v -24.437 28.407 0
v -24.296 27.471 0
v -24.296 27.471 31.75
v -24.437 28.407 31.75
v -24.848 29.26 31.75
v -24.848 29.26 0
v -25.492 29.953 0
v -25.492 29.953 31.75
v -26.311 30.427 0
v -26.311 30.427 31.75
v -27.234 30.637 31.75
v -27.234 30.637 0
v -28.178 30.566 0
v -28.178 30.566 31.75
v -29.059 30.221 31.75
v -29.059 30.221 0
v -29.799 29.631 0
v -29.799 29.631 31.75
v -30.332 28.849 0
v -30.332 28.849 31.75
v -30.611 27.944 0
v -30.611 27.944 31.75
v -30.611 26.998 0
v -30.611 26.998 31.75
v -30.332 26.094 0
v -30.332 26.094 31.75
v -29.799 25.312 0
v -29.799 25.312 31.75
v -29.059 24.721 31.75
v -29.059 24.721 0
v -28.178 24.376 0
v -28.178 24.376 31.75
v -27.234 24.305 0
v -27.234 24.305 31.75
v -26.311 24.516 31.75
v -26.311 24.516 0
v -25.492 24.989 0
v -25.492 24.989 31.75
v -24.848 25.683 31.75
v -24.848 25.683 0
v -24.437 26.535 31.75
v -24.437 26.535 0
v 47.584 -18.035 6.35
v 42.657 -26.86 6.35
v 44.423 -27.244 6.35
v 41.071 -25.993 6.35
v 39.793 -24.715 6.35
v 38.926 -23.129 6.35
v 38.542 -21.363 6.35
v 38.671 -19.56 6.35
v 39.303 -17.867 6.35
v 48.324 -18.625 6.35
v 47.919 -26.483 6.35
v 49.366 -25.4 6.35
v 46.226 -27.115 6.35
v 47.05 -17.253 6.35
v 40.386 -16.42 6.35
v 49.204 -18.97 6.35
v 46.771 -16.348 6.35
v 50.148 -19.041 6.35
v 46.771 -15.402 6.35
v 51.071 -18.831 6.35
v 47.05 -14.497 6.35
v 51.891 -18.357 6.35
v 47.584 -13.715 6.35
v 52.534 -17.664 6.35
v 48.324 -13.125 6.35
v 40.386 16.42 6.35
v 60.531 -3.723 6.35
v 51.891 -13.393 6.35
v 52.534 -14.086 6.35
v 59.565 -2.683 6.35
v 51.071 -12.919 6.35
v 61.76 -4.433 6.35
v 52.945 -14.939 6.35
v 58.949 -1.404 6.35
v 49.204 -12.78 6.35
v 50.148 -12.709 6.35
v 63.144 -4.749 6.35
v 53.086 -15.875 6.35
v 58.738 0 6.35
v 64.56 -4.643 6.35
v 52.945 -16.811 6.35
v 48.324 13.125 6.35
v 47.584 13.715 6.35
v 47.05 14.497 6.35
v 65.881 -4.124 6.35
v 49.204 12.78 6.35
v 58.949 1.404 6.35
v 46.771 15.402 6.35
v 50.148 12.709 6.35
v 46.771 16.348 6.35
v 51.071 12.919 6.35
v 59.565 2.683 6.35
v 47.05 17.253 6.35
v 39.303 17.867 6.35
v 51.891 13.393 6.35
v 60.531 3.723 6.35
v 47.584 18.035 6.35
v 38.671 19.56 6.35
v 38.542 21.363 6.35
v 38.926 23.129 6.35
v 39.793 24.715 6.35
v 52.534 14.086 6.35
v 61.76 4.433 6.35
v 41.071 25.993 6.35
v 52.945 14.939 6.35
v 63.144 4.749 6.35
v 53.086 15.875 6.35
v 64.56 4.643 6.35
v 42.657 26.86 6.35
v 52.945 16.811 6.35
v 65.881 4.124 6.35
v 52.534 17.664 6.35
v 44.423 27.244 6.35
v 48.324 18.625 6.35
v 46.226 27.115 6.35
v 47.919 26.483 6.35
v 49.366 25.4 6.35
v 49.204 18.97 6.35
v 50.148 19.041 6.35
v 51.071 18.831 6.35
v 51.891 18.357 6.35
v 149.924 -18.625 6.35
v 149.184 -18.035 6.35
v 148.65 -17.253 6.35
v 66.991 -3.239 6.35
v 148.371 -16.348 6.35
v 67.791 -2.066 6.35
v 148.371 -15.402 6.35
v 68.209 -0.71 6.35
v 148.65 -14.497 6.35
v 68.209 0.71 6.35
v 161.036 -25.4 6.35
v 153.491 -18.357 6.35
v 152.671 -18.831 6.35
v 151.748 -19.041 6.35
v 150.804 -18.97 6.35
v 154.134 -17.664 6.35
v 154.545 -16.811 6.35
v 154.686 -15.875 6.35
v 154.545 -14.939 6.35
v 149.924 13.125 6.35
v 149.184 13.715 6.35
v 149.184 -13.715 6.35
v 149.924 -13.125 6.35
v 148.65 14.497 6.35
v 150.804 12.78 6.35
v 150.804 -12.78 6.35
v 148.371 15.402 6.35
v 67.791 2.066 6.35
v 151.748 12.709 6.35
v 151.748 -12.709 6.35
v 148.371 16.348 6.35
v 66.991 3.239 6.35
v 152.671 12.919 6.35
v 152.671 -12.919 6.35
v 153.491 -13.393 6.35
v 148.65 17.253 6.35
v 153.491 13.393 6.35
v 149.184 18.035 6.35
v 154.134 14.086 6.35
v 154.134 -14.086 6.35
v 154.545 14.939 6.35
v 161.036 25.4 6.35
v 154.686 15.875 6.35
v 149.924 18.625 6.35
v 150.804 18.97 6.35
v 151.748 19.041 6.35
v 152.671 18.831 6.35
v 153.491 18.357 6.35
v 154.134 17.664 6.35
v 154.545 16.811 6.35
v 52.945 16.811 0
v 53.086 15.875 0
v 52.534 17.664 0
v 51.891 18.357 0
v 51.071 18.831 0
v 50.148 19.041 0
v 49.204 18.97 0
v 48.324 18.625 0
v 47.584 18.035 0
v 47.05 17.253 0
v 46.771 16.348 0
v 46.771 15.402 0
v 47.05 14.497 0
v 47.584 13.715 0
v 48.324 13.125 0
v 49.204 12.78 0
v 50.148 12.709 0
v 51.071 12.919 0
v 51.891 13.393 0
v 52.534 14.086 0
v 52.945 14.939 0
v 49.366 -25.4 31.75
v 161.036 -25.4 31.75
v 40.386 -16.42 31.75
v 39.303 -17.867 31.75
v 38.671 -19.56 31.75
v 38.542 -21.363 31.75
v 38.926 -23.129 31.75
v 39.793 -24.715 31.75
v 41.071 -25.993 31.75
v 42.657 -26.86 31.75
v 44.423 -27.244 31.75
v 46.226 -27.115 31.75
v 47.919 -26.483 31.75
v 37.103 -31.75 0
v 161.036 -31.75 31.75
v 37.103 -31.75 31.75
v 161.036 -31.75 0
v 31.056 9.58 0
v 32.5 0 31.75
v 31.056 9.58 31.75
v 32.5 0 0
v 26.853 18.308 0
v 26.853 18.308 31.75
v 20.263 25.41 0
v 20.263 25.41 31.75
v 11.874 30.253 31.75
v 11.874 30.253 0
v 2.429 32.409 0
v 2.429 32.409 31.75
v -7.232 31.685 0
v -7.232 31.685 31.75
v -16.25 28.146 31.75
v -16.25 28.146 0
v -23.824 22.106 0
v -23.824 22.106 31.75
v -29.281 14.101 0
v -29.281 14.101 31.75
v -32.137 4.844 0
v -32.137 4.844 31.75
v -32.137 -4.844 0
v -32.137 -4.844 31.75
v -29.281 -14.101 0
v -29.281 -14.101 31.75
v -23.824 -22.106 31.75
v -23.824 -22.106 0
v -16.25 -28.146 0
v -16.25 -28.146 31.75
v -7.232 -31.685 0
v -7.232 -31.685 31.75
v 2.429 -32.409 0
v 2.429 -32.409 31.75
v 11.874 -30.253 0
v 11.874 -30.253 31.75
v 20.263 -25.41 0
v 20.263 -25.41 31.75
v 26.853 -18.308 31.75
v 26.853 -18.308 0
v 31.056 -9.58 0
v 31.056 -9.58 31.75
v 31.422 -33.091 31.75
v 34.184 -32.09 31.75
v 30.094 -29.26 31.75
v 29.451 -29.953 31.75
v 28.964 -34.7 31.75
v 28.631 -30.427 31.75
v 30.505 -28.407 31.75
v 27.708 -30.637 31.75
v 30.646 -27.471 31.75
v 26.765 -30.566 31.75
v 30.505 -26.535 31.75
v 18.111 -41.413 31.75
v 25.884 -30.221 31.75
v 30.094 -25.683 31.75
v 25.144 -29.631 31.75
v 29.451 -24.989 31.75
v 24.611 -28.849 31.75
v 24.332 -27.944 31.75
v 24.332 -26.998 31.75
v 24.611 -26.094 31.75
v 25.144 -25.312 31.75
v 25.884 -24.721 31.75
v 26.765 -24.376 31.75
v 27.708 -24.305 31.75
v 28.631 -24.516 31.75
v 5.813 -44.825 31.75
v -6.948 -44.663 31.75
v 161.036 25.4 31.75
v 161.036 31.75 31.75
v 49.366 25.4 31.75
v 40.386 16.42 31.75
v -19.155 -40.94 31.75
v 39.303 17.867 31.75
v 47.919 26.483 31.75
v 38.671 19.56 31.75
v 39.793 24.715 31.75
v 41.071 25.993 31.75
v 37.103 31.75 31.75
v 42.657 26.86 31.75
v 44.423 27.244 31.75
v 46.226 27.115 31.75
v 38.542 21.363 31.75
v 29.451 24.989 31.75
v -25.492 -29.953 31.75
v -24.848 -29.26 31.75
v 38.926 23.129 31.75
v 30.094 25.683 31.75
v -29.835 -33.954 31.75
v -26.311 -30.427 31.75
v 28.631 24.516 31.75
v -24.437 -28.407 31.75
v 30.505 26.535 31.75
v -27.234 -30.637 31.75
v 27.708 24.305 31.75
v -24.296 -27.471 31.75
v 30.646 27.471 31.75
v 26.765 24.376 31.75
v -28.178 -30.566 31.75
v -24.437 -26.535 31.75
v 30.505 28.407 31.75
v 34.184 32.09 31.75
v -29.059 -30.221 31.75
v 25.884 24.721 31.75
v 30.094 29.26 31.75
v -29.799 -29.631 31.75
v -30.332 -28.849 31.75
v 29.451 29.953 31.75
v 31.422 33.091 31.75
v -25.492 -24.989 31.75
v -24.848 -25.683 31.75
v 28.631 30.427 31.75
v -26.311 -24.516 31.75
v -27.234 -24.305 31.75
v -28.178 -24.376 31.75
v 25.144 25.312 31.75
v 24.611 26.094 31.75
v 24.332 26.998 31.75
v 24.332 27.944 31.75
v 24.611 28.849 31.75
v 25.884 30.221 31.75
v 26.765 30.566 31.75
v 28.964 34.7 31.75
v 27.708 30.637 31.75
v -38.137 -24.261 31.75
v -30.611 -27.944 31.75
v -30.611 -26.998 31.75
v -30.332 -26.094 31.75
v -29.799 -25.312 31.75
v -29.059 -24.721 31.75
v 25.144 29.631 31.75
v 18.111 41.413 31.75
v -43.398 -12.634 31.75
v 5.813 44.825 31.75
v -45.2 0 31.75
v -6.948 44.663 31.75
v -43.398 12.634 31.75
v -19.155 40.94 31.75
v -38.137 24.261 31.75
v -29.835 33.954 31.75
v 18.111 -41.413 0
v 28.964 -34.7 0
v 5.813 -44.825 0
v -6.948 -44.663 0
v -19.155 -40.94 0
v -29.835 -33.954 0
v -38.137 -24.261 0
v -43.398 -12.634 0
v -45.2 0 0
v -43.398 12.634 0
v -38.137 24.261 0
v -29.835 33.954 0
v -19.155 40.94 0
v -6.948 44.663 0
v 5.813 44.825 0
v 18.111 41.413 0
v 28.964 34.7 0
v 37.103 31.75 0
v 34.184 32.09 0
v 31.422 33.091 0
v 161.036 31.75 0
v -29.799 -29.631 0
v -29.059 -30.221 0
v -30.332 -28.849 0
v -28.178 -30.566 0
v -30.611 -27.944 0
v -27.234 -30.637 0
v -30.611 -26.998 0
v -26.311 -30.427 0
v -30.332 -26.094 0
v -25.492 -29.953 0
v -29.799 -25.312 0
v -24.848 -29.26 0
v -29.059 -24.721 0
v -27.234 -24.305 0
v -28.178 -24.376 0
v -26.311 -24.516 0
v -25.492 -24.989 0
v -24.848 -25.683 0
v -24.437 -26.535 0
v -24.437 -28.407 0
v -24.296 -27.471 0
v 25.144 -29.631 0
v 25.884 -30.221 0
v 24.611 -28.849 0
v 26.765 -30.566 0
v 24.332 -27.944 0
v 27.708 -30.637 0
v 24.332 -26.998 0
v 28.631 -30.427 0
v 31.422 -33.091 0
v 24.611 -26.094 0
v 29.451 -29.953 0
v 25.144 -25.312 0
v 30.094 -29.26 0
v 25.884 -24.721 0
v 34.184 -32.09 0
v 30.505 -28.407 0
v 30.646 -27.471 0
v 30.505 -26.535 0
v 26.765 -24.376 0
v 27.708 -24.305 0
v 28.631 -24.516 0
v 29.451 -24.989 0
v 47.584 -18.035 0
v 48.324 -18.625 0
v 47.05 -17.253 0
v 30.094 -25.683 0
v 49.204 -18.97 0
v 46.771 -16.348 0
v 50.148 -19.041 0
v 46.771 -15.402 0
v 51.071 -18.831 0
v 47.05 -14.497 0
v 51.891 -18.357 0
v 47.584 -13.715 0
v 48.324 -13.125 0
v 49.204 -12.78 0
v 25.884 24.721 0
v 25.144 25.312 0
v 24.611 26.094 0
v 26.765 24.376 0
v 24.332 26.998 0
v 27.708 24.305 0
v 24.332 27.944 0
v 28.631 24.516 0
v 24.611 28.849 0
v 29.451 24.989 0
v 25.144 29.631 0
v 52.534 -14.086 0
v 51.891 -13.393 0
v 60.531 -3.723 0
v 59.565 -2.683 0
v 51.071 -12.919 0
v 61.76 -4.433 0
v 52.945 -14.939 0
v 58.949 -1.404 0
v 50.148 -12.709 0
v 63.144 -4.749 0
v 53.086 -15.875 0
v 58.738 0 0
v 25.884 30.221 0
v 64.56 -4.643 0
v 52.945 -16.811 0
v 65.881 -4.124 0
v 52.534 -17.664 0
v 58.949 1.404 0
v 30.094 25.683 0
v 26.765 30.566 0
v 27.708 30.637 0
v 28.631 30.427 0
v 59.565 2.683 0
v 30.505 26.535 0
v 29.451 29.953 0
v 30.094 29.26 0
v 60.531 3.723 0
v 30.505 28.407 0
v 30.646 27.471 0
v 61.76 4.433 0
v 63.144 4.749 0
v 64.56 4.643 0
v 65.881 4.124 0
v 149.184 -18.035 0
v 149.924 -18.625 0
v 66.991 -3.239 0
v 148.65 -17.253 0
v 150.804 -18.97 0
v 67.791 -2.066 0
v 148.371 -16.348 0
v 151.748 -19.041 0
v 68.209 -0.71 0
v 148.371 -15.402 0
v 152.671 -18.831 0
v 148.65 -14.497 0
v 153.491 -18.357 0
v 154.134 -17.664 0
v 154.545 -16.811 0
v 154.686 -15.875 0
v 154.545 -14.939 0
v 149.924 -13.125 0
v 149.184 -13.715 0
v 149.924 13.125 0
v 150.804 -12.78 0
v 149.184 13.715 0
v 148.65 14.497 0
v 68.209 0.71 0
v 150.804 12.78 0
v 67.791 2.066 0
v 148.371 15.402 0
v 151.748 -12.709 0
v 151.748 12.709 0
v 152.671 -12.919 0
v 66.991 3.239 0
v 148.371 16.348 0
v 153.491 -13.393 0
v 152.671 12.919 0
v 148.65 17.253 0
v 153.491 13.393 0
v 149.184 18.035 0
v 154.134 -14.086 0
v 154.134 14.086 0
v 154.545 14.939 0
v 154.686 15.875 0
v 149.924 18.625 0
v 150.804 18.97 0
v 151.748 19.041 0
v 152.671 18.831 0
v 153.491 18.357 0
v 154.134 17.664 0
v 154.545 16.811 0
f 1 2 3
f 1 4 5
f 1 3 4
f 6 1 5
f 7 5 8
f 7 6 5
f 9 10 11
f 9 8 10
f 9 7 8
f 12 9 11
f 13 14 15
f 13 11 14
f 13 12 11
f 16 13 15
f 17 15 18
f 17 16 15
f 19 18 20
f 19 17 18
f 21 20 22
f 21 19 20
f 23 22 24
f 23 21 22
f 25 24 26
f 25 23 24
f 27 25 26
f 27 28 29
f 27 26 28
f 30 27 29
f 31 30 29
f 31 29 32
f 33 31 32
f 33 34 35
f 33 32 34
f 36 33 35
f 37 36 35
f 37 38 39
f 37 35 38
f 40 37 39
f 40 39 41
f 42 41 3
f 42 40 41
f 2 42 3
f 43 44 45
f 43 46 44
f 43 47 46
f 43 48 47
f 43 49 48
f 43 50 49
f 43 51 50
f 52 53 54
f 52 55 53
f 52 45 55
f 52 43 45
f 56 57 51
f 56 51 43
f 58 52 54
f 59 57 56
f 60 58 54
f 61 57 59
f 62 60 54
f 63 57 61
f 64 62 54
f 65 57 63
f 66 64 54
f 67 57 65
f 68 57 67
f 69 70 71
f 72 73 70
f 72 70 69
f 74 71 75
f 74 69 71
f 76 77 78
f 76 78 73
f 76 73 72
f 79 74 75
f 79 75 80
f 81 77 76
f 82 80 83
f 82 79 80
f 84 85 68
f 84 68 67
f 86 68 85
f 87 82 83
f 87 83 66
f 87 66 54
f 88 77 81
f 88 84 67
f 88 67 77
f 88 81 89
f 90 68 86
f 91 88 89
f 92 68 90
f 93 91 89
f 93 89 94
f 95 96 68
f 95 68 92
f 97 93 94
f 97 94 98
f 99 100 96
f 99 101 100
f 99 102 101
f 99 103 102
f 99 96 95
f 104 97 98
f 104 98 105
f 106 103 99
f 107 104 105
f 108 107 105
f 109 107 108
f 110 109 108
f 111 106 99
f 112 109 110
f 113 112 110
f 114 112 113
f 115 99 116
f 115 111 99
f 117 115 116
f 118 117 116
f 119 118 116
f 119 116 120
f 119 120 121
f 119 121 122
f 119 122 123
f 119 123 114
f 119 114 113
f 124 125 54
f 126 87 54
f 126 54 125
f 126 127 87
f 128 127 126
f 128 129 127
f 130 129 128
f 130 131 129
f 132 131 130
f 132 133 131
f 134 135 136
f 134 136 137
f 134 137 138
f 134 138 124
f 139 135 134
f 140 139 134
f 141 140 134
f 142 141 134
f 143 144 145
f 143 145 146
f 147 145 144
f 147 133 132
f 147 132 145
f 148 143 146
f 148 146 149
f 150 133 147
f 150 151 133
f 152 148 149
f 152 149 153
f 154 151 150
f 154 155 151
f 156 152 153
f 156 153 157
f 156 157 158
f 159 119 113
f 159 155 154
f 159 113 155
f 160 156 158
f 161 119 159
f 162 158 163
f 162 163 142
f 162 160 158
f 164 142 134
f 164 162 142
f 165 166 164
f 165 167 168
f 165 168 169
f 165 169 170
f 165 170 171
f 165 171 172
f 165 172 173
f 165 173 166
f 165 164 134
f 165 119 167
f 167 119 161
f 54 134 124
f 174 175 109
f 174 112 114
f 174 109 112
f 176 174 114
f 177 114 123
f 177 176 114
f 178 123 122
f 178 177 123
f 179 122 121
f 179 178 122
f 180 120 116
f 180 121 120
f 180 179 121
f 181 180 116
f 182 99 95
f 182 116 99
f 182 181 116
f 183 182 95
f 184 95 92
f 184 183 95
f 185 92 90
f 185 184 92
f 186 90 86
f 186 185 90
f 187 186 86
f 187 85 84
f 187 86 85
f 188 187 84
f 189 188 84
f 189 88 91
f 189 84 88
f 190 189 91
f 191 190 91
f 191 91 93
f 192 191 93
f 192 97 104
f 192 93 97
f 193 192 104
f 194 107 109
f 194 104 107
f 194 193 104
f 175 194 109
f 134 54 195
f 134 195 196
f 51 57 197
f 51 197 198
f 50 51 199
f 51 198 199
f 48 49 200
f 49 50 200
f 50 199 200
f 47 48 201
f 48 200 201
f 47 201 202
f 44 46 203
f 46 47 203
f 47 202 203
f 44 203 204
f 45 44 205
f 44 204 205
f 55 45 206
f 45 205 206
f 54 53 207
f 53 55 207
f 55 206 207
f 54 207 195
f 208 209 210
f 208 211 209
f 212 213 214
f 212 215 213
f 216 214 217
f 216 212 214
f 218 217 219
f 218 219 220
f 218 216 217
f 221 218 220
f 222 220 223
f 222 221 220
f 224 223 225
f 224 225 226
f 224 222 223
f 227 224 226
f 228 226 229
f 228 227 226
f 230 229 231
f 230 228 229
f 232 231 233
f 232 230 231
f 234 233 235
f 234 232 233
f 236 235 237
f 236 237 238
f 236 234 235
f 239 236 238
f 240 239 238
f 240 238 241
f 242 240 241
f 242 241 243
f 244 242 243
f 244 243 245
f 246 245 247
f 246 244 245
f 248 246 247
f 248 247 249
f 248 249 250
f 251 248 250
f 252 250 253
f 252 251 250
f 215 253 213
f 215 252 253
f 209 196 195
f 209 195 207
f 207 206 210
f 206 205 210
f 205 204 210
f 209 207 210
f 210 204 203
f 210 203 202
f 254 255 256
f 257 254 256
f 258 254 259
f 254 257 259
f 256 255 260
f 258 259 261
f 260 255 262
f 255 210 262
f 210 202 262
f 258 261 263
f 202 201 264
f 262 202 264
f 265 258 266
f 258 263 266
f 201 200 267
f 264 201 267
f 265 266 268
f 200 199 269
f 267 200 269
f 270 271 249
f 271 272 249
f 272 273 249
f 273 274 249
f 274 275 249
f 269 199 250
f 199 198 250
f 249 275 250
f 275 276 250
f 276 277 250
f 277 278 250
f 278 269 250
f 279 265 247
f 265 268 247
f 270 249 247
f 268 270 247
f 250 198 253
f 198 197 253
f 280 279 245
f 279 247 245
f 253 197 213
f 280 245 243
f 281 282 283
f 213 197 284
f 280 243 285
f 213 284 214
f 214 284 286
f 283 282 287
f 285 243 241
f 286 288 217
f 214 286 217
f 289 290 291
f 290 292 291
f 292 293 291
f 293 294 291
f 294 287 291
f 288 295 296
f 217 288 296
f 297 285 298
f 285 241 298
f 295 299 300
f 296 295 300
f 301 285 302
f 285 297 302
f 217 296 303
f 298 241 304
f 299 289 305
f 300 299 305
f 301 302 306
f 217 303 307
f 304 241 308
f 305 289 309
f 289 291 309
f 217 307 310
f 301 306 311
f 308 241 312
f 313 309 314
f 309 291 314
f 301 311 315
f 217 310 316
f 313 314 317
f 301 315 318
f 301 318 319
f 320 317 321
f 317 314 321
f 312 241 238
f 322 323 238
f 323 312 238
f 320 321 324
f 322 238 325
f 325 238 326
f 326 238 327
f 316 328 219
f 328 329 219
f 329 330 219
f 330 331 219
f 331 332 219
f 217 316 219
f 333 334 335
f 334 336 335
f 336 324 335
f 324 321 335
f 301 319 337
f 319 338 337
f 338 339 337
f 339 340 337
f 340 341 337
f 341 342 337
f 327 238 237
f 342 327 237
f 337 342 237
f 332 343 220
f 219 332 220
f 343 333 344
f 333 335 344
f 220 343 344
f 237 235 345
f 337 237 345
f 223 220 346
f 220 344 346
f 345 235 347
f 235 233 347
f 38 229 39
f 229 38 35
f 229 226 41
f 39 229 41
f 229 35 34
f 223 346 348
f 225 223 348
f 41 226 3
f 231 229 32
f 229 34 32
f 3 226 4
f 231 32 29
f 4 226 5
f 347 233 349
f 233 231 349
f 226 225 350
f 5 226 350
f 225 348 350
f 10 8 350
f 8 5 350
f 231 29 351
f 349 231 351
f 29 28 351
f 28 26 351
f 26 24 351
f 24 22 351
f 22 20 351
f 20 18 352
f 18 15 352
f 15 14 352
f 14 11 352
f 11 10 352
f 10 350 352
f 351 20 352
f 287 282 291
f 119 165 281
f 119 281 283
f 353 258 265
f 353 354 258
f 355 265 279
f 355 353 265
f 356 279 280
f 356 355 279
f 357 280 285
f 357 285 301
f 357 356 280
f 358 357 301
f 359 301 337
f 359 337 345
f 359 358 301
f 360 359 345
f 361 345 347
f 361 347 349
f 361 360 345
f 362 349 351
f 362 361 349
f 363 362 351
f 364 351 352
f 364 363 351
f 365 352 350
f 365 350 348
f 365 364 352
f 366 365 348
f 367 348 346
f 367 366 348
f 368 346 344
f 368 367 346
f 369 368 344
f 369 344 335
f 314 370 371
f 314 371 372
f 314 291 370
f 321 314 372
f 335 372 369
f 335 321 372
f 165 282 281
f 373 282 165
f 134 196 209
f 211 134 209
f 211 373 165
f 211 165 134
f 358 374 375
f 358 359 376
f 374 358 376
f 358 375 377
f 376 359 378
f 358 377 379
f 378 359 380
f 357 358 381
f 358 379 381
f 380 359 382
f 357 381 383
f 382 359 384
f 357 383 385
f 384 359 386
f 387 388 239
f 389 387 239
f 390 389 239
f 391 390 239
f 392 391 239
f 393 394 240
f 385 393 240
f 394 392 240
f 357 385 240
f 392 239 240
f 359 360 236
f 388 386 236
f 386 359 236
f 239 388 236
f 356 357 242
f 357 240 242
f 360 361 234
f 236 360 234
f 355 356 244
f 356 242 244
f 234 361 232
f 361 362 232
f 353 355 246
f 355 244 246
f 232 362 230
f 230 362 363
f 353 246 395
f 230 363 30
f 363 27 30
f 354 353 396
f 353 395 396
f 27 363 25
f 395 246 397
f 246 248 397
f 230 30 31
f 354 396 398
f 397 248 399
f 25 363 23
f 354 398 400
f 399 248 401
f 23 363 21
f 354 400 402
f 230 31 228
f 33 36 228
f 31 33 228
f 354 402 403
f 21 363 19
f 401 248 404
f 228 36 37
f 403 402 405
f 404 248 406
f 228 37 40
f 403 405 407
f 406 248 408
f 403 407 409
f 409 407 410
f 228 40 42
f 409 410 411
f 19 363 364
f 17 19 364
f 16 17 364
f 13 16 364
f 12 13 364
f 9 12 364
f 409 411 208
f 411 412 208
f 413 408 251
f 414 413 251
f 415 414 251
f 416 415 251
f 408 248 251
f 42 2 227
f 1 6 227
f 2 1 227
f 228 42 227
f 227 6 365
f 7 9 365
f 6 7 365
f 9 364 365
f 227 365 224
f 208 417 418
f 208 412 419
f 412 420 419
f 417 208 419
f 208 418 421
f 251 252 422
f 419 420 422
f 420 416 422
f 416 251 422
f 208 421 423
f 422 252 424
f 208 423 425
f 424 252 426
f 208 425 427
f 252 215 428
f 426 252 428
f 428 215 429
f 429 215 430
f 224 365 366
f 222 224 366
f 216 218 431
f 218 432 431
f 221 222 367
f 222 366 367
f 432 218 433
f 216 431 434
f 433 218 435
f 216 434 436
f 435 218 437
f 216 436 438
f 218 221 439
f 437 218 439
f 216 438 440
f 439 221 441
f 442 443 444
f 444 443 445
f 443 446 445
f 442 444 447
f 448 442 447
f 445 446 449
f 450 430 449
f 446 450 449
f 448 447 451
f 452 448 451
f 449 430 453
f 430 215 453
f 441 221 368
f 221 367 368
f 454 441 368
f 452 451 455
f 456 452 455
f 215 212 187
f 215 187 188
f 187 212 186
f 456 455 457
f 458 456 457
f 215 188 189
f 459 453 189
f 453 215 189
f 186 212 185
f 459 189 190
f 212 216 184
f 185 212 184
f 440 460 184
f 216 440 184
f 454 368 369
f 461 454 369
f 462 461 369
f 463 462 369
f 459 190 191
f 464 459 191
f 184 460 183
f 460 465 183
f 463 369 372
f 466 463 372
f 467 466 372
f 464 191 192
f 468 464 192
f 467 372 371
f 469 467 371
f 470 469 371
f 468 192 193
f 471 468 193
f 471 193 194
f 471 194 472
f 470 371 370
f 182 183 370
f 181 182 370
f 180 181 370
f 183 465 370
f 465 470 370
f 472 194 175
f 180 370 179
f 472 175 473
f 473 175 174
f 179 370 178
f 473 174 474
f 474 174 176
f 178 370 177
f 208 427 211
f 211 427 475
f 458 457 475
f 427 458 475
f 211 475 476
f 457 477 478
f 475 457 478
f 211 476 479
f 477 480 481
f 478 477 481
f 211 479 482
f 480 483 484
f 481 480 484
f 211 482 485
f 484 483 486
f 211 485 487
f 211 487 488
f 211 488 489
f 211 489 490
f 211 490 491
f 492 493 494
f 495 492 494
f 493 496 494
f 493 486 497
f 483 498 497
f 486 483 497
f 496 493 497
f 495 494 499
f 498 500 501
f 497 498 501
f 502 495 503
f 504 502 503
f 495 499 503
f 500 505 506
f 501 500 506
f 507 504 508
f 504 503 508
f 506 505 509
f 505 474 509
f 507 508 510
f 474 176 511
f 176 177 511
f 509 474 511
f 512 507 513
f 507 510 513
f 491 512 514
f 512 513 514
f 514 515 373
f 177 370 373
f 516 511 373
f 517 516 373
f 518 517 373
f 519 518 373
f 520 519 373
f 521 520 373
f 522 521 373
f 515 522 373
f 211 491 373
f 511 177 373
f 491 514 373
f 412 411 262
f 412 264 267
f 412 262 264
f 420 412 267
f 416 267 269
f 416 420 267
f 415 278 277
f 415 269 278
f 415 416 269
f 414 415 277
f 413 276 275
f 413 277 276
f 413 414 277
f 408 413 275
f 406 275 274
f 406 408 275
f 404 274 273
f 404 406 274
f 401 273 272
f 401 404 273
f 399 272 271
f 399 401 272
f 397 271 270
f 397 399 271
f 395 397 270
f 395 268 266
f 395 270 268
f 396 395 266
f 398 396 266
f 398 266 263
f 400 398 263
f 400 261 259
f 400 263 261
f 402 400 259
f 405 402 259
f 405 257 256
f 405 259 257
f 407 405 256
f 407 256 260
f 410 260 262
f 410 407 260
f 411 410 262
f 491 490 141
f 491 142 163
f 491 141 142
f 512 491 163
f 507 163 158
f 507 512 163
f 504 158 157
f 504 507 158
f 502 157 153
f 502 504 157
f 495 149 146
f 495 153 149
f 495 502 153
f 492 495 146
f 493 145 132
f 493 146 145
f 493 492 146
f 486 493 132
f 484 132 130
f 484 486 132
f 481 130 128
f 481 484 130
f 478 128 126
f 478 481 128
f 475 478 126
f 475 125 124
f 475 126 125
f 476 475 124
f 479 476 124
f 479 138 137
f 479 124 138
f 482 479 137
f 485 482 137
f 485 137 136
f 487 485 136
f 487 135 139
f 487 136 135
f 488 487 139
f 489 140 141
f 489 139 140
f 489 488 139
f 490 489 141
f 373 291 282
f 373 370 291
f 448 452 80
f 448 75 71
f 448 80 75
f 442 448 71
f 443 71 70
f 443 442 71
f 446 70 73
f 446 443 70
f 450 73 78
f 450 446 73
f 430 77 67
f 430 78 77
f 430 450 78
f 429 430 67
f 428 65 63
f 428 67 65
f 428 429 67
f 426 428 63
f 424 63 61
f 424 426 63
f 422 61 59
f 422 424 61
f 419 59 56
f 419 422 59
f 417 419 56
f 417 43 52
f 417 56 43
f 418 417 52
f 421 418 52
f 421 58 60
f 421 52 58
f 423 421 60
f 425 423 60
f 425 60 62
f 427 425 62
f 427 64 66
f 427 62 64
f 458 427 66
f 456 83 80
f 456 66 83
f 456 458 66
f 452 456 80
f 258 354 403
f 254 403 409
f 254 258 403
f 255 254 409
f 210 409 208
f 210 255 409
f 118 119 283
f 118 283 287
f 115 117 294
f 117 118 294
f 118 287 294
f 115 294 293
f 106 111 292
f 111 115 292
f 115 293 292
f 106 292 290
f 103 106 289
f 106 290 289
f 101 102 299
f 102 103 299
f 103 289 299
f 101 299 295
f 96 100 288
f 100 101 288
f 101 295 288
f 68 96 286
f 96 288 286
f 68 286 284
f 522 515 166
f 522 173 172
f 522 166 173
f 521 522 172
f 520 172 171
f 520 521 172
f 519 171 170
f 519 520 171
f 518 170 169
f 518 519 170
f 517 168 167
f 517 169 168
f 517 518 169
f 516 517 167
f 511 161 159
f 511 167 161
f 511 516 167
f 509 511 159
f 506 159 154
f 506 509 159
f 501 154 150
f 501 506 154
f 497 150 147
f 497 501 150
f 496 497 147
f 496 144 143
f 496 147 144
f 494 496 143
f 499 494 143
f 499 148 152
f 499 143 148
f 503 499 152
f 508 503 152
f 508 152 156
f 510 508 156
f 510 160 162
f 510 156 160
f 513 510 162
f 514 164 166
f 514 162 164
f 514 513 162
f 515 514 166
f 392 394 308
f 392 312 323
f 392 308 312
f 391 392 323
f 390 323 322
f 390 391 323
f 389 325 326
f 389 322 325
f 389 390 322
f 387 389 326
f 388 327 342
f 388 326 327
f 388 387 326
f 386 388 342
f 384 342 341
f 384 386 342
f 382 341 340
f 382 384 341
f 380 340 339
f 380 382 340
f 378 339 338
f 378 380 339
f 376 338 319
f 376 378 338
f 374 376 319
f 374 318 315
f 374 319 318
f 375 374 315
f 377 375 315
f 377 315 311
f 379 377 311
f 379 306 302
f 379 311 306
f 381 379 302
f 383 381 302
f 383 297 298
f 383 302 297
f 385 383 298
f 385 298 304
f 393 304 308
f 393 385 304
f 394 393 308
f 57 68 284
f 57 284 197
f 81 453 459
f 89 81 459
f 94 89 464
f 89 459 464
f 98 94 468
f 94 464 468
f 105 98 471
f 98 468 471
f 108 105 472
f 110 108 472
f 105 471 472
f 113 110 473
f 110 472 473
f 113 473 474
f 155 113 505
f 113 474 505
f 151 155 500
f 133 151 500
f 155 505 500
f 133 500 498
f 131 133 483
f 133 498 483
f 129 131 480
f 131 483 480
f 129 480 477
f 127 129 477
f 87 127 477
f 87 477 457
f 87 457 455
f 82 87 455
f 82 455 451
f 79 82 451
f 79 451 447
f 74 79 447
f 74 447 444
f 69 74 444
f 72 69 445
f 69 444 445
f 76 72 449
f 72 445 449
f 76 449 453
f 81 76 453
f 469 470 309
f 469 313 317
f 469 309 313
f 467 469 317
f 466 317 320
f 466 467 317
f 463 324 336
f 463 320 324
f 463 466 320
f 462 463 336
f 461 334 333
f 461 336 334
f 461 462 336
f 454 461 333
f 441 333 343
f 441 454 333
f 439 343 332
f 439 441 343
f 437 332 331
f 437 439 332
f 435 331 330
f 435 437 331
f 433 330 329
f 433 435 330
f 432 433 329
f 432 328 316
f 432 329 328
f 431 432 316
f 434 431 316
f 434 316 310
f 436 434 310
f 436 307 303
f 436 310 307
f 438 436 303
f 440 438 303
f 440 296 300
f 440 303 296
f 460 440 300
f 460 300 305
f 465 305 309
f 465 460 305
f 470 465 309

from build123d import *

# Parameters (mm, degrees)
SKETCH1_R               = 32.5
SKETCH1_W               = 120.65
SKETCH1_H               = 50.8
BOSS_EXTRUDE2_DEPTH     = 6.35
BOSS_EXTRUDE3_START     = 6.35
SKETCH1_3_R             = 32.5
BOSS_EXTRUDE3_DEPTH     = 25.4
CUT_EXTRUDE1_DEPTH      = 170.176810751
CUT_EXTRUDE1_DEPTH_BACK = 170.176810751
SKETCH2_R               = 3.175
SKETCH3_R               = 6.35
CUT_EXTRUDE2_DEPTH      = 25.4
SKETCH4_3_R             = 4.7625
CUT_EXTRUDE3_DEPTH      = 6.35
FILLET1_R               = 12.7


with BuildPart() as part:
    # Sketch1 → Boss-Extrude2 (new body)
    # profile 1 of 2: a face of its own
    with BuildSketch(Plane.XY):
        with BuildLine():
            Line((32.171066193, 31.75), (161.036, 31.75))
            Line((161.036, 31.75), (161.036, 25.4))
            Line((161.036, 25.4), (40.386, 25.4))
            Line((40.386, 25.4), (40.386, -25.4))
            Line((40.386, -25.4), (161.036, -25.4))
            Line((161.036, -25.4), (161.036, -31.75))
            Line((161.036, -31.75), (32.171066193, -31.75))
            ThreePointArc((32.171066193, -31.75), (-45.2, 0), (32.171066193, 31.75))
        make_face()
        Circle(SKETCH1_R, mode=Mode.SUBTRACT)
    # profile 2 of 2: a face of its own
    with BuildSketch(Plane.XY):
        with Locations((100.711, 0)):
            Rectangle(SKETCH1_W, SKETCH1_H)
    extrude(amount=BOSS_EXTRUDE2_DEPTH)

    # Sketch1<3> → Boss-Extrude3 (add)
    with BuildSketch(Plane.XY.offset(BOSS_EXTRUDE3_START)):
        with BuildLine():
            Line((32.171066193, 31.75), (161.036, 31.75))
            Line((161.036, 31.75), (161.036, 25.4))
            Line((161.036, 25.4), (40.386, 25.4))
            Line((40.386, 25.4), (40.386, -25.4))
            Line((40.386, -25.4), (161.036, -25.4))
            Line((161.036, -25.4), (161.036, -31.75))
            Line((161.036, -31.75), (32.171066193, -31.75))
            ThreePointArc((32.171066193, -31.75), (-45.2, 0), (32.171066193, 31.75))
        make_face()
        Circle(SKETCH1_3_R, mode=Mode.SUBTRACT)
    extrude(amount=BOSS_EXTRUDE3_DEPTH)

    # Sketch2 → Cut-Extrude1 (cut, two sides: drawn at the far end of the back side and taken through both)
    with BuildSketch(Plane.XY.offset(6.35).offset(-CUT_EXTRUDE1_DEPTH_BACK)):
        with Locations((49.911, 15.875)):
            Circle(SKETCH2_R)
        with Locations((151.511, 15.875)):
            Circle(SKETCH2_R)
        with Locations((151.511, -15.875)):
            Circle(SKETCH2_R)
        with Locations((49.911, -15.875)):
            Circle(SKETCH2_R)
        with Locations((27.471098449, 27.471098449)):
            Circle(SKETCH2_R)
        with Locations((27.471098449, -27.471098449)):
            Circle(SKETCH2_R)
        with Locations((-27.471098449, -27.471098449)):
            Circle(SKETCH2_R)
        with Locations((-27.471098449, 27.471098449)):
            Circle(SKETCH2_R)
    extrude(amount=CUT_EXTRUDE1_DEPTH + CUT_EXTRUDE1_DEPTH_BACK, mode=Mode.SUBTRACT)

    # Sketch3 → Cut-Extrude2 (cut)
    with BuildSketch(Plane.XY.offset(31.75)):
        with Locations((44.876128061, 20.909871939)):
            Circle(SKETCH3_R)
        with Locations((44.876128061, -20.909871939)):
            Circle(SKETCH3_R)
    extrude(amount=-CUT_EXTRUDE2_DEPTH, mode=Mode.SUBTRACT)

    # Sketch4<3> → Cut-Extrude3 (cut)
    with BuildSketch(Plane(origin=(0, 0, 0), x_dir=(-1, 0, 0), z_dir=(0, 0, -1))):
        with Locations((-63.5, 0)):
            Circle(SKETCH4_3_R)
    extrude(amount=-CUT_EXTRUDE3_DEPTH, mode=Mode.SUBTRACT)

    # Fillet1
    fillet1_edges = [part.edges().sort_by_distance(p)[0] for p in [
        (32.171066193, -31.75, 15.875),
        (32.171066193, 31.75, 15.875),
    ]]
    fillet(fillet1_edges, radius=FILLET1_R)


solid = part.part
